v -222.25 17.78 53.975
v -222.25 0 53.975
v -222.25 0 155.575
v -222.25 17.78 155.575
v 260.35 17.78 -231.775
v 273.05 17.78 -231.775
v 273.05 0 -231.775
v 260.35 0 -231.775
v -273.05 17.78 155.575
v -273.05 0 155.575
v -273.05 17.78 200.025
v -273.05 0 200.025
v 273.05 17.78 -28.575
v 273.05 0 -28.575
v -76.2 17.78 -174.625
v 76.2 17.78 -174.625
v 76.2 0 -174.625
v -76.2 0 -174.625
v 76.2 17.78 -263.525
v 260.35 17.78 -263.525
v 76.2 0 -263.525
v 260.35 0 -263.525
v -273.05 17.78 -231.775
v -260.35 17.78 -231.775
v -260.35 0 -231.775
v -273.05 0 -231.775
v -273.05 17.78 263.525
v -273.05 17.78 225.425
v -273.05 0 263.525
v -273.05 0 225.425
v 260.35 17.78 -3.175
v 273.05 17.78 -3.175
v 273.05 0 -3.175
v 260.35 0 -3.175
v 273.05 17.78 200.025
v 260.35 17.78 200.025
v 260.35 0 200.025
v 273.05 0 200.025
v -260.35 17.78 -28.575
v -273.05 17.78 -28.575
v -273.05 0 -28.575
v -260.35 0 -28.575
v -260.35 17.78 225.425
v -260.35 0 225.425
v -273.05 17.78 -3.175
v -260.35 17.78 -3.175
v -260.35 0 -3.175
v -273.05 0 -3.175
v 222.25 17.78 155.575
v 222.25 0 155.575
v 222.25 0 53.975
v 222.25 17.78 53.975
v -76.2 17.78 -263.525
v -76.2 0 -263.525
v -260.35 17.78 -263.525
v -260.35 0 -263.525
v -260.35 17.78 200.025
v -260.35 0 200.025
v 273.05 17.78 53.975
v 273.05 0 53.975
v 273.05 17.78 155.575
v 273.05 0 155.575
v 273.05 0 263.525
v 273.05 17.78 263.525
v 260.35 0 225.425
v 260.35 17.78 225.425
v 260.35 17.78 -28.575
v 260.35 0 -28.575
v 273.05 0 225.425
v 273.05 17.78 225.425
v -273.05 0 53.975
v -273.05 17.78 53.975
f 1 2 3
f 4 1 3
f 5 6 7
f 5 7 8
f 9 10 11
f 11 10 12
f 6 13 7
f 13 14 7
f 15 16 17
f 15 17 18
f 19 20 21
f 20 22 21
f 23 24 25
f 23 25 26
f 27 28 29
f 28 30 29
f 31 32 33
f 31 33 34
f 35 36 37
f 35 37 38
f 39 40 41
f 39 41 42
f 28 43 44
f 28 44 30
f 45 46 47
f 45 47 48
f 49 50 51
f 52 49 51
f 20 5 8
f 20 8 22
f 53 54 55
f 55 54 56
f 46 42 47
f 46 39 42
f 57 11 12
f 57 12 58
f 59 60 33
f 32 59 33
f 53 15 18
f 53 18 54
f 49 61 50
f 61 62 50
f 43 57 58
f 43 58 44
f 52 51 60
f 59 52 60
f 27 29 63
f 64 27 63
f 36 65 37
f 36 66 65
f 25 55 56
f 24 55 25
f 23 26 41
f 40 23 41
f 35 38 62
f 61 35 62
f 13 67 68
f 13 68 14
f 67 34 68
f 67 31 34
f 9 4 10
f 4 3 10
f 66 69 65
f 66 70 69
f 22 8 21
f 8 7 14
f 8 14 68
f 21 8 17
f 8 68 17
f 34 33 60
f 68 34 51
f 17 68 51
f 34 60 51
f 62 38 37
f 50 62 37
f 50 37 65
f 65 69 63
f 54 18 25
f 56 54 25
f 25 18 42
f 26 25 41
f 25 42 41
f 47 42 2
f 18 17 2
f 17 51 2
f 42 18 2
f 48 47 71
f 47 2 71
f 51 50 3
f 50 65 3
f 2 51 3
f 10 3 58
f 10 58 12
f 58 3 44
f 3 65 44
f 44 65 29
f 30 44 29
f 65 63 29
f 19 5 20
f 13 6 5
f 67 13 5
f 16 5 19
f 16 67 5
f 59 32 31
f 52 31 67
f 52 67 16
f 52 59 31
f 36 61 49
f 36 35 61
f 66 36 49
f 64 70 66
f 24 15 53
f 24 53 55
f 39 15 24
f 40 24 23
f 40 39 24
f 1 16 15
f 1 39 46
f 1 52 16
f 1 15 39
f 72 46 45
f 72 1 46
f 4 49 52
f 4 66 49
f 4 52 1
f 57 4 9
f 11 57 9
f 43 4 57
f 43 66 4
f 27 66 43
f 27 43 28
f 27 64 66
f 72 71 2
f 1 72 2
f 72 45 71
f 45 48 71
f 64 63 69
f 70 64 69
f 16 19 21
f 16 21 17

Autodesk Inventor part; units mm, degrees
ref_plane "XZ Plane" through (0, 0, 0) normal (0, 1, 0) x (-1, 0, 0)
ref_plane "XY Plane" through (0, 0, 0) normal (0, 0, 1) x (1, 0, 0)
sketch "Sketch1" plane through (0, 0, 0) normal (0, 1, 0) x (-1, 0, 0)
  line L0 (-273.05, 263.525) -> (-273.05, -263.525)
  line L1 (-273.05, -263.525) -> (273.05, -263.525)
  line L2 (273.05, -263.525) -> (273.05, 263.525)
  line L3 (273.05, 263.525) -> (-273.05, 263.525)
  line L4 (-273.05, 263.525) -> (273.05, -263.525) construction
  line L5 (-273.05, -263.525) -> (273.05, 263.525) construction
  point P0 (0, 0)
  dimension "baseLength" = 527.05
  dimension "baseWidth" = 546.1
extrude "Extrusion1" add sketch "Sketch1" along normal blind 17.78
sketch "Sketch2" plane through (0, 0, 0) normal (0, -1, 0) x (1, 0, 0)
  line L0 (273.05, 263.525) -> (273.05, -263.525) projected
  line L1 (273.05, 155.575) -> (222.25, 155.575)
  line L2 (222.25, 155.575) -> (222.25, 53.975)
  line L3 (222.25, 53.975) -> (273.05, 53.975)
  line L4 (273.05, 53.975) -> (273.05, 155.575)
  line L5 (-273.05, 263.525) -> (273.05, 263.525) projected
  point P0 (0, 0)
  dimension "backToEndOfGearBox" = 107.95
  dimension "backToFrontOfGearBox" = 209.55
  dimension "wdithForGearBox" = 50.8
extrude "Extrusion2" cut sketch "Sketch2" against normal through all
mirror "Mirror1" about plane through (0, 0, 0) normal (1, 0, 0) of "Extrusion2"
sketch "Sketch3" plane through (0, 17.78, 0) normal (0, 1, 0) x (1, 0, 0)
  line L0 (273.05, -225.425) -> (260.35, -225.425)
  line L1 (260.35, -225.425) -> (260.35, -200.025)
  line L2 (260.35, -200.025) -> (273.05, -200.025)
  line L3 (273.05, -200.025) -> (273.05, -225.425)
  line L4 (273.05, -263.525) -> (273.05, -155.575) projected
  line L5 (-273.05, -263.525) -> (273.05, -263.525) projected
  point P0 (0, 0)
  dimension "d9" = 25.4
  dimension "d10" = 12.7
  dimension "d11" = 38.1
extrude "Extrusion3" cut sketch "Sketch3" against normal through all
mirror "Mirror2" about plane through (0, 0, 0) normal (1, 0, 0) of "Extrusion3"
sketch "Sketch4" plane through (0, 17.78, 0) normal (0, 1, 0) x (1, 0, 0)
  line L0 (273.05, -53.975) -> (273.05, 263.525) projected
  line L1 (273.05, 3.175) -> (260.35, 3.175)
  line L2 (260.35, 3.175) -> (260.35, 28.575)
  line L3 (260.35, 28.575) -> (273.05, 28.575)
  line L4 (273.05, 28.575) -> (273.05, 3.175)
  line L5 (-273.05, -263.525) -> (273.05, -263.525) projected
  point P0 (0, 0)
  dimension "d14" = 25.4
  dimension "d15" = 266.7
  dimension "d16" = 12.7
extrude "Extrusion4" cut sketch "Sketch4" against normal through all
mirror "Mirror3" about plane through (0, 0, 0) normal (1, 0, 0) of "Extrusion4"
sketch "Sketch5" plane through (0, 17.78, 0) normal (0, 1, 0) x (1, 0, 0)
  line L0 (273.05, 231.775) -> (260.35, 231.775)
  line L1 (260.35, 231.775) -> (260.35, 263.525)
  line L2 (260.35, 263.525) -> (273.05, 263.525)
  line L3 (273.05, 263.525) -> (273.05, 231.775)
  line L4 (273.05, 28.575) -> (273.05, 263.525) projected
  line L5 (273.05, 263.525) -> (-273.05, 263.525) projected
  point P0 (0, 0)
  dimension "d19" = 12.7
  dimension "d20" = 31.75
extrude "Extrusion5" cut sketch "Sketch5" against normal through all
mirror "Mirror4" about plane through (0, 0, 0) normal (1, 0, 0) of "Extrusion5"
sketch "Sketch8" plane through (0, 17.78, 0) normal (0, 1, 0) x (1, 0, 0)
  line L0 (-76.2, 263.525) -> (76.2, 263.525)
  line L1 (76.2, 263.525) -> (76.2, 174.625)
  line L2 (76.2, 174.625) -> (-76.2, 174.625)
  line L3 (-76.2, 174.625) -> (-76.2, 263.525)
  line L4 (260.35, 263.525) -> (-260.35, 263.525) projected
  point P0 (0, 0)
  dimension "d23" = 76.2
  dimension "d24" = 76.2
  dimension "d25" = 88.9
extrude "Extrusion6" cut sketch "Sketch8" against normal through all
equation "\"baseLength\" = userBaseLength"
equation "\"baseWidth\" = userBaseWidth"
equation "\"d9\" = lengthOfSpacingForBolt"
equation "\"d10\" = widthOfSpacingForBolt"
equation "\"d11\" = distanceFromBackForEndBolt"
equation "\"d14\" = lengthOfSpacingForBolt"
equation "\"d16\" = widthOfSpacingForBolt"
equation "\"d19\" = widthOfSpacingForBolt"
equation "\"spaceingAlongSides\" = 3.175"
equation "\"distanceFromBackForEndBolt\" = 38.1"
equation "\"widthOfSpacingForBolt\" = 12.7"
equation "\"lengthOfSpacingForBolt\" = 25.4"
equation "\"userBaseLength\" = 527.05"
equation "\"userBaseWidth\" = 546.1"
properties part number "RhinoBottomFloorPlate01" material "Wood (Birch)"
